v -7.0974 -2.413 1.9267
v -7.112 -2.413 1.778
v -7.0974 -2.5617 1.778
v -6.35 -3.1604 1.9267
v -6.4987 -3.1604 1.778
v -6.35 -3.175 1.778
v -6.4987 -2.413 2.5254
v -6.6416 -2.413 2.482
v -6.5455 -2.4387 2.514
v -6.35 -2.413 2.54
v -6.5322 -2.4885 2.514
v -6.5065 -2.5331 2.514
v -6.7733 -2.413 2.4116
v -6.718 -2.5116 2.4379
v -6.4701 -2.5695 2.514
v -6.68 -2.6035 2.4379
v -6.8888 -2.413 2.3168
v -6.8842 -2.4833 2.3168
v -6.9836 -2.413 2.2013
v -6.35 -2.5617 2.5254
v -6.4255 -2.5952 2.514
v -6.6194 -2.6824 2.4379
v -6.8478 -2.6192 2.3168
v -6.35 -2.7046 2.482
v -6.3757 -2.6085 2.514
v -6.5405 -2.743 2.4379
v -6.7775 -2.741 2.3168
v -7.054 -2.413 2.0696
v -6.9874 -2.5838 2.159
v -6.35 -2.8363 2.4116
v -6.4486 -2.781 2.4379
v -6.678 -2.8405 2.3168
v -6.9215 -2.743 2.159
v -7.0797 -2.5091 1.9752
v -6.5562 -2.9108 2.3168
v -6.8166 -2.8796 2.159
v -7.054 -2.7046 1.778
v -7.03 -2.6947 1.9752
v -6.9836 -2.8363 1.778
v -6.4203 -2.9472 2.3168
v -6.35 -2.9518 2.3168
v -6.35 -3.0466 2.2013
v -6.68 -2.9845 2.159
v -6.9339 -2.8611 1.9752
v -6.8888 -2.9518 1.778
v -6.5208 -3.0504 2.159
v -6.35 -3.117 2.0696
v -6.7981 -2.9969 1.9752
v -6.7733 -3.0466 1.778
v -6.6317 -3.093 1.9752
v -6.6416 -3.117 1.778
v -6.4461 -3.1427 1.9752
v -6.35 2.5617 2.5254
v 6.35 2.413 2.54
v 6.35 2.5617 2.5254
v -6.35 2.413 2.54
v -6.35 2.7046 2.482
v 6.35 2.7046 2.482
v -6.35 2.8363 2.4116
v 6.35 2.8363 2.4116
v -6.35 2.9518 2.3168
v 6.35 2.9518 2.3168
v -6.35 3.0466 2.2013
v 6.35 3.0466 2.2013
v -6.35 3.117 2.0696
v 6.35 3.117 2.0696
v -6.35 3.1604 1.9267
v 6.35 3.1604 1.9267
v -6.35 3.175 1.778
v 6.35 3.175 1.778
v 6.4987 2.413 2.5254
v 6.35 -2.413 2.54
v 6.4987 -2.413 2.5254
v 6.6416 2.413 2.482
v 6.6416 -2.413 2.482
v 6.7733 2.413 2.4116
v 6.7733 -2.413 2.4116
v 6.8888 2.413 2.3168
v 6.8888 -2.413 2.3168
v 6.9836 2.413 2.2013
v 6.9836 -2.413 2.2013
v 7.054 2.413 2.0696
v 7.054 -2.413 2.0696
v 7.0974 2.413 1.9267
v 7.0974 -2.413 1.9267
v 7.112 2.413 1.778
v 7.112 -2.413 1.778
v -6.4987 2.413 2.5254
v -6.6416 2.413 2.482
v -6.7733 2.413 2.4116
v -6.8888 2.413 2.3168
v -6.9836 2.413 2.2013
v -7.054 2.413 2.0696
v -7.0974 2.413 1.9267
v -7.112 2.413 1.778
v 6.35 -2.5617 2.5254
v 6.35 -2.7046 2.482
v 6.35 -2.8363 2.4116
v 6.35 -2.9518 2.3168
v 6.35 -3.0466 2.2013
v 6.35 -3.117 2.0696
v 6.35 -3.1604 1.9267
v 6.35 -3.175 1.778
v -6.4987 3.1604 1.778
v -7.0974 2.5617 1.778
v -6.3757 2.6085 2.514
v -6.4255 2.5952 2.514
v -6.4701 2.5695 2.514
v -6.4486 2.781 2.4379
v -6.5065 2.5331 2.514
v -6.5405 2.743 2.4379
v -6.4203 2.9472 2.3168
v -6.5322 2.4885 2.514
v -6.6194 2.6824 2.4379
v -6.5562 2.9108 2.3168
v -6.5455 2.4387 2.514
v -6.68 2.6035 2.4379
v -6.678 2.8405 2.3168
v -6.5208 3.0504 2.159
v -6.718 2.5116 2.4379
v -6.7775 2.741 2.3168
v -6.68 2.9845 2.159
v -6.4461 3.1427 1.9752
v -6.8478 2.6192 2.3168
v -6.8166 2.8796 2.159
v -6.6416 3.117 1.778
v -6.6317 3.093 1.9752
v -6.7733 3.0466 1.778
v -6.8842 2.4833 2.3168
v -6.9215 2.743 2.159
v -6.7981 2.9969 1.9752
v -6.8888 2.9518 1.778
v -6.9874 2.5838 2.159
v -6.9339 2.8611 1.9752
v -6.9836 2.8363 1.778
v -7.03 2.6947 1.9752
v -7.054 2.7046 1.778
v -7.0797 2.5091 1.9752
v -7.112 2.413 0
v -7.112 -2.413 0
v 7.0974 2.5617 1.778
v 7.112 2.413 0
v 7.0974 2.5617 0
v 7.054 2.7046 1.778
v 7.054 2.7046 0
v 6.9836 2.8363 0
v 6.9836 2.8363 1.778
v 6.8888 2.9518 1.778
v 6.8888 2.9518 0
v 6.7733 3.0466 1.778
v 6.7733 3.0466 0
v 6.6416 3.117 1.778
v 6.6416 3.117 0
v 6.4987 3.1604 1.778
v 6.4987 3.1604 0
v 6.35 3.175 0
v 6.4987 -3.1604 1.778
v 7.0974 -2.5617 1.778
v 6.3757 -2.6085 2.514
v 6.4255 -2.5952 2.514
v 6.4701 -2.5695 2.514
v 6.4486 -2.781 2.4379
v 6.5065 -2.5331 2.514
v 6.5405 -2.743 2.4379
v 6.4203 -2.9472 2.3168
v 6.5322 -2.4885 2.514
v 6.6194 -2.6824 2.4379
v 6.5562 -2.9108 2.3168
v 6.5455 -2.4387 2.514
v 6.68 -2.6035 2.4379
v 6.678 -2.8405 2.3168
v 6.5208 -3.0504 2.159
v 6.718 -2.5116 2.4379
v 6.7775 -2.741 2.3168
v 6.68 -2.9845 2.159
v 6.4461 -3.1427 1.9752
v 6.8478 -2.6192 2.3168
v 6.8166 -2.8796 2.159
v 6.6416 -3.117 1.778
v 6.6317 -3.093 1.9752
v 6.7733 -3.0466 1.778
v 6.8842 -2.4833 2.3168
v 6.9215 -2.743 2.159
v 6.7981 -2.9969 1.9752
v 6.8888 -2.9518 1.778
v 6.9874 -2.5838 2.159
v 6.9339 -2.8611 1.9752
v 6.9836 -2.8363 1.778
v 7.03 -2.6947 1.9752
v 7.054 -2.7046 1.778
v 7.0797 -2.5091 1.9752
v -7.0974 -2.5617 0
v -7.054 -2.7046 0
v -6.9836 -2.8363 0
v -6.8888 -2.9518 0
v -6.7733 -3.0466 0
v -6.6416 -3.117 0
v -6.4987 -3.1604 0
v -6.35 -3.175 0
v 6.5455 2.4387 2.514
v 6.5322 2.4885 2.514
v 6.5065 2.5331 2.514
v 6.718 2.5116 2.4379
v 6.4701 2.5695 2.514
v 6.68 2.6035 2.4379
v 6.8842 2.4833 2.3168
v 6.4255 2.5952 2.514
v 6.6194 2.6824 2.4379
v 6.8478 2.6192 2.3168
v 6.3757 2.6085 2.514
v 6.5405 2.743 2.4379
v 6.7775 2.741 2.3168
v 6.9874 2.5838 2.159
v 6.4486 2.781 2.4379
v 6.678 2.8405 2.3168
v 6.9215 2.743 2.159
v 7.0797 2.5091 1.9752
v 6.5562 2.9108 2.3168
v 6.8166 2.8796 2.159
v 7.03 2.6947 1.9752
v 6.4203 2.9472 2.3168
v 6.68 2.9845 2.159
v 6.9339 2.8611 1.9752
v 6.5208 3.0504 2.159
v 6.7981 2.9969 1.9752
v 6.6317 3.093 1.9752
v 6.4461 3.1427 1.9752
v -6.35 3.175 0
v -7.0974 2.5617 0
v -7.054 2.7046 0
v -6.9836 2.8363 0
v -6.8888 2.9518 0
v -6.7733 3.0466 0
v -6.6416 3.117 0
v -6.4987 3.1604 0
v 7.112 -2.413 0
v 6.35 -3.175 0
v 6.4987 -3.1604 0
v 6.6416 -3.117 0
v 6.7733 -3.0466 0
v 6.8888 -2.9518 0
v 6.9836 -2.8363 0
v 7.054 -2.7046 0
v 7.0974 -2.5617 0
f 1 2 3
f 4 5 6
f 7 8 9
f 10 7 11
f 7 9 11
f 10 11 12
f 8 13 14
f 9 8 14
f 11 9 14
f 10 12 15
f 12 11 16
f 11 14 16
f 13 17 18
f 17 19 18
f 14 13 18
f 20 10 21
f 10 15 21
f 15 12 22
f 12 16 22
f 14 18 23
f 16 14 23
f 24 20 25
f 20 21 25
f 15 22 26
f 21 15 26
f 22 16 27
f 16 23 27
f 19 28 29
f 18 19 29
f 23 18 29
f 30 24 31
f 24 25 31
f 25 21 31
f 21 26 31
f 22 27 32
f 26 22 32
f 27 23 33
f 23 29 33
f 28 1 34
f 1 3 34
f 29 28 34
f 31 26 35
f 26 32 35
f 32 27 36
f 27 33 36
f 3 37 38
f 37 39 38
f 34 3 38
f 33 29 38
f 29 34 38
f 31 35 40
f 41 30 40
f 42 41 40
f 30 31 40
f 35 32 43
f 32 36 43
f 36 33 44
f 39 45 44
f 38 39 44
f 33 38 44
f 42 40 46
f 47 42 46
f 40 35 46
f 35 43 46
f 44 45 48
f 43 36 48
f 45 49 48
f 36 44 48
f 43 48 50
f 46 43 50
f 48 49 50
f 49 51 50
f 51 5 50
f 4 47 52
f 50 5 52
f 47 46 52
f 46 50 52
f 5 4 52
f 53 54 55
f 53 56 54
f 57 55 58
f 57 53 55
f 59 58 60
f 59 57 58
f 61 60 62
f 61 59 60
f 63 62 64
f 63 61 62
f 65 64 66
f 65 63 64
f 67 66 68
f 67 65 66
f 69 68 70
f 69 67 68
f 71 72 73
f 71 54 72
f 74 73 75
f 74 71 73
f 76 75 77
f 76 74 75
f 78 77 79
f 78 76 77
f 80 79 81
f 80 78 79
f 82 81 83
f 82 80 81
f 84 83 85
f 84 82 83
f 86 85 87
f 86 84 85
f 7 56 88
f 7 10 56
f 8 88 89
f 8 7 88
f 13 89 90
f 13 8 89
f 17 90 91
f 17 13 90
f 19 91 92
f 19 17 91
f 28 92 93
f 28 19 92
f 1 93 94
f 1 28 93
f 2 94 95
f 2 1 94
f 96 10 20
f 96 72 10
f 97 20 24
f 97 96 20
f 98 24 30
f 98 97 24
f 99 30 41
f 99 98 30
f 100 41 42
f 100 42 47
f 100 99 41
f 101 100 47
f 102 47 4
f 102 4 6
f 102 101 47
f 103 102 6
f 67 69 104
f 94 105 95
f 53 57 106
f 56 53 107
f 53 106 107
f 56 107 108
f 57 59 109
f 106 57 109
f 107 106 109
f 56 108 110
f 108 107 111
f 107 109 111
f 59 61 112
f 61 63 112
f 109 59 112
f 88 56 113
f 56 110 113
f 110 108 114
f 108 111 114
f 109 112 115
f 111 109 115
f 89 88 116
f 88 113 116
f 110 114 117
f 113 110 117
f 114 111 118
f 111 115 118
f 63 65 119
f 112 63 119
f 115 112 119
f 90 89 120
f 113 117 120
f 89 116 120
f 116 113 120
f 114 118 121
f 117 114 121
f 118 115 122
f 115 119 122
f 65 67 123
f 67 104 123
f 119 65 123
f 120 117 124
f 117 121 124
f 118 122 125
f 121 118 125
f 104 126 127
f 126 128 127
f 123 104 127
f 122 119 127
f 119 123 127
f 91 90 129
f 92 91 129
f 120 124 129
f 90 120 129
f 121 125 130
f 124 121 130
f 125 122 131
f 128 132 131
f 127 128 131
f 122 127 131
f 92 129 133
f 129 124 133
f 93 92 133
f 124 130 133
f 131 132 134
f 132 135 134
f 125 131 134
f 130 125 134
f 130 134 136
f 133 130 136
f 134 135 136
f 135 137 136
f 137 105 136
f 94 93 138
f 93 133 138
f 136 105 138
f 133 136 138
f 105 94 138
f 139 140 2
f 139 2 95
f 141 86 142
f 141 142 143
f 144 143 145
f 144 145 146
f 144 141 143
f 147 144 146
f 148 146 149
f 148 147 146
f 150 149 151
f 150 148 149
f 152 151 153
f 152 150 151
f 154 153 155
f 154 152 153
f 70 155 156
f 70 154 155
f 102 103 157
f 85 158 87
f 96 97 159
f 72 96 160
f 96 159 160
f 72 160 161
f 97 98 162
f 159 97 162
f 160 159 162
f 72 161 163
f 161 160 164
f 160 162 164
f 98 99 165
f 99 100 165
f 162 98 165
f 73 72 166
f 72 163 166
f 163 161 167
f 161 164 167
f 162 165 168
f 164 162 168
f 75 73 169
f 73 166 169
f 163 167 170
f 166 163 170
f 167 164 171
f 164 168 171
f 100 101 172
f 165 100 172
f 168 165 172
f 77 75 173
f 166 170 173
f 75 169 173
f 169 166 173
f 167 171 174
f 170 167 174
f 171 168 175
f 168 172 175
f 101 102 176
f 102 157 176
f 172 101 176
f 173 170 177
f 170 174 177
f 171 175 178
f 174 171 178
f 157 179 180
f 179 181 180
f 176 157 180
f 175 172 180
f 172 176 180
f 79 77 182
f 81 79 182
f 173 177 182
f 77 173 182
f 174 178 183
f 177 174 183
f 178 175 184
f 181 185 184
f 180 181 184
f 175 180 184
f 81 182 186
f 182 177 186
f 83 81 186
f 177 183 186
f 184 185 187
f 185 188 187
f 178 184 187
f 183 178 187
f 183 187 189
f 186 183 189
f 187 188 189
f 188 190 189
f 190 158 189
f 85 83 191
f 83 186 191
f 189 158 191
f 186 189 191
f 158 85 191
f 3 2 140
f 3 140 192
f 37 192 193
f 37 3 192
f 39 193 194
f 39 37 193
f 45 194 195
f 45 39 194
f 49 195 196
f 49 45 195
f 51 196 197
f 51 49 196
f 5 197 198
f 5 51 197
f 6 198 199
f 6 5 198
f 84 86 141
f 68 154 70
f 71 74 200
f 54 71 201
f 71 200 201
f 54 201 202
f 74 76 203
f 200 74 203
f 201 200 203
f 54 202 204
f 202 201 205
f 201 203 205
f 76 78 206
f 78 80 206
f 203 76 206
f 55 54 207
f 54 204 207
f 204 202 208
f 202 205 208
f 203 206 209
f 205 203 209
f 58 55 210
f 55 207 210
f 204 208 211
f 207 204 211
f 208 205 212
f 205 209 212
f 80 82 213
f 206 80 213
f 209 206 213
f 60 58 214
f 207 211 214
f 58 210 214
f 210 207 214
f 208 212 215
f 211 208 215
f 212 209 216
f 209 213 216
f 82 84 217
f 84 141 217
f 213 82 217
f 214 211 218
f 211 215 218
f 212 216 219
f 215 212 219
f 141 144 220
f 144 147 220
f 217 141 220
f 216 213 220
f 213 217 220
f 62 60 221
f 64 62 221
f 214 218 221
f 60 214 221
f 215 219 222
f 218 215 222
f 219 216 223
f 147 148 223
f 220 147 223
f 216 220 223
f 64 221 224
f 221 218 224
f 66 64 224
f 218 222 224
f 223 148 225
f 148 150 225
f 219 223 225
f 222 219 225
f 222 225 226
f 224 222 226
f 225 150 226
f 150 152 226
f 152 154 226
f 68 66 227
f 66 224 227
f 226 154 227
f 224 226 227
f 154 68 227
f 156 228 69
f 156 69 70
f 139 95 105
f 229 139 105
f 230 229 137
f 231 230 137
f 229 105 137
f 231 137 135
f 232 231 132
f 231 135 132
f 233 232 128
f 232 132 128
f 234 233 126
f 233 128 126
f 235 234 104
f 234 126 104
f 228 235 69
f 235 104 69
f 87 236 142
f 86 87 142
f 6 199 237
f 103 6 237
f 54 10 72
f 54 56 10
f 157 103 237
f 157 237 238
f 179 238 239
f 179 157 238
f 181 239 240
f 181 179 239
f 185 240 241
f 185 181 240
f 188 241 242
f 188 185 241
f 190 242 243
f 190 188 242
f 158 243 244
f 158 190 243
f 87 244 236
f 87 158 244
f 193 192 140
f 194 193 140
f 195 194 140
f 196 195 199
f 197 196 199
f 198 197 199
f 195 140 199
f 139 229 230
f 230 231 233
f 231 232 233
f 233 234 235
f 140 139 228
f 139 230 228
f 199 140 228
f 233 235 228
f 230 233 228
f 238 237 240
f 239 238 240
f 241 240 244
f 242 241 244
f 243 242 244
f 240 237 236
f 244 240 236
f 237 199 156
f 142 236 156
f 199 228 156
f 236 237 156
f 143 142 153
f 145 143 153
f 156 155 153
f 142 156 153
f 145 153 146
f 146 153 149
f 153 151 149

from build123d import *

# Parameters (mm, degrees)
SKETCH1_W      = 14.224
SKETCH1_H      = 6.35
EXTRUDE1_DEPTH = 2.54
FILLET1_R      = 0.762
FILLET2_R      = 0.762


with BuildPart() as part:
    # Sketch1 → Extrude1 (new body)
    with BuildSketch(Plane.XY):
        Rectangle(SKETCH1_W, SKETCH1_H)
    extrude(amount=EXTRUDE1_DEPTH)

    # Fillet1
    fillet1_edges = [part.edges().sort_by_distance(p)[0] for p in [
        (7.112, -3.175, 1.27),
        (-7.112, -3.175, 1.27),
        (-7.112, 3.175, 1.27),
        (7.112, 3.175, 1.27),
    ]]
    fillet(fillet1_edges, radius=FILLET1_R)

    # Fillet2
    fillet2_edges = [part.edges().sort_by_distance(p)[0] for p in [
        (0, -3.175, 2.54),
        (-7.112, 0, 2.54),
        (7.112, 0, 2.54),
        (0, 3.175, 2.54),
        (6.888815367, -2.951815367, 2.54),
        (6.888815367, 2.951815367, 2.54),
        (-6.888815367, 2.951815367, 2.54),
        (-6.888815367, -2.951815367, 2.54),
    ]]
    fillet(fillet2_edges, radius=FILLET2_R)


solid = part.part
